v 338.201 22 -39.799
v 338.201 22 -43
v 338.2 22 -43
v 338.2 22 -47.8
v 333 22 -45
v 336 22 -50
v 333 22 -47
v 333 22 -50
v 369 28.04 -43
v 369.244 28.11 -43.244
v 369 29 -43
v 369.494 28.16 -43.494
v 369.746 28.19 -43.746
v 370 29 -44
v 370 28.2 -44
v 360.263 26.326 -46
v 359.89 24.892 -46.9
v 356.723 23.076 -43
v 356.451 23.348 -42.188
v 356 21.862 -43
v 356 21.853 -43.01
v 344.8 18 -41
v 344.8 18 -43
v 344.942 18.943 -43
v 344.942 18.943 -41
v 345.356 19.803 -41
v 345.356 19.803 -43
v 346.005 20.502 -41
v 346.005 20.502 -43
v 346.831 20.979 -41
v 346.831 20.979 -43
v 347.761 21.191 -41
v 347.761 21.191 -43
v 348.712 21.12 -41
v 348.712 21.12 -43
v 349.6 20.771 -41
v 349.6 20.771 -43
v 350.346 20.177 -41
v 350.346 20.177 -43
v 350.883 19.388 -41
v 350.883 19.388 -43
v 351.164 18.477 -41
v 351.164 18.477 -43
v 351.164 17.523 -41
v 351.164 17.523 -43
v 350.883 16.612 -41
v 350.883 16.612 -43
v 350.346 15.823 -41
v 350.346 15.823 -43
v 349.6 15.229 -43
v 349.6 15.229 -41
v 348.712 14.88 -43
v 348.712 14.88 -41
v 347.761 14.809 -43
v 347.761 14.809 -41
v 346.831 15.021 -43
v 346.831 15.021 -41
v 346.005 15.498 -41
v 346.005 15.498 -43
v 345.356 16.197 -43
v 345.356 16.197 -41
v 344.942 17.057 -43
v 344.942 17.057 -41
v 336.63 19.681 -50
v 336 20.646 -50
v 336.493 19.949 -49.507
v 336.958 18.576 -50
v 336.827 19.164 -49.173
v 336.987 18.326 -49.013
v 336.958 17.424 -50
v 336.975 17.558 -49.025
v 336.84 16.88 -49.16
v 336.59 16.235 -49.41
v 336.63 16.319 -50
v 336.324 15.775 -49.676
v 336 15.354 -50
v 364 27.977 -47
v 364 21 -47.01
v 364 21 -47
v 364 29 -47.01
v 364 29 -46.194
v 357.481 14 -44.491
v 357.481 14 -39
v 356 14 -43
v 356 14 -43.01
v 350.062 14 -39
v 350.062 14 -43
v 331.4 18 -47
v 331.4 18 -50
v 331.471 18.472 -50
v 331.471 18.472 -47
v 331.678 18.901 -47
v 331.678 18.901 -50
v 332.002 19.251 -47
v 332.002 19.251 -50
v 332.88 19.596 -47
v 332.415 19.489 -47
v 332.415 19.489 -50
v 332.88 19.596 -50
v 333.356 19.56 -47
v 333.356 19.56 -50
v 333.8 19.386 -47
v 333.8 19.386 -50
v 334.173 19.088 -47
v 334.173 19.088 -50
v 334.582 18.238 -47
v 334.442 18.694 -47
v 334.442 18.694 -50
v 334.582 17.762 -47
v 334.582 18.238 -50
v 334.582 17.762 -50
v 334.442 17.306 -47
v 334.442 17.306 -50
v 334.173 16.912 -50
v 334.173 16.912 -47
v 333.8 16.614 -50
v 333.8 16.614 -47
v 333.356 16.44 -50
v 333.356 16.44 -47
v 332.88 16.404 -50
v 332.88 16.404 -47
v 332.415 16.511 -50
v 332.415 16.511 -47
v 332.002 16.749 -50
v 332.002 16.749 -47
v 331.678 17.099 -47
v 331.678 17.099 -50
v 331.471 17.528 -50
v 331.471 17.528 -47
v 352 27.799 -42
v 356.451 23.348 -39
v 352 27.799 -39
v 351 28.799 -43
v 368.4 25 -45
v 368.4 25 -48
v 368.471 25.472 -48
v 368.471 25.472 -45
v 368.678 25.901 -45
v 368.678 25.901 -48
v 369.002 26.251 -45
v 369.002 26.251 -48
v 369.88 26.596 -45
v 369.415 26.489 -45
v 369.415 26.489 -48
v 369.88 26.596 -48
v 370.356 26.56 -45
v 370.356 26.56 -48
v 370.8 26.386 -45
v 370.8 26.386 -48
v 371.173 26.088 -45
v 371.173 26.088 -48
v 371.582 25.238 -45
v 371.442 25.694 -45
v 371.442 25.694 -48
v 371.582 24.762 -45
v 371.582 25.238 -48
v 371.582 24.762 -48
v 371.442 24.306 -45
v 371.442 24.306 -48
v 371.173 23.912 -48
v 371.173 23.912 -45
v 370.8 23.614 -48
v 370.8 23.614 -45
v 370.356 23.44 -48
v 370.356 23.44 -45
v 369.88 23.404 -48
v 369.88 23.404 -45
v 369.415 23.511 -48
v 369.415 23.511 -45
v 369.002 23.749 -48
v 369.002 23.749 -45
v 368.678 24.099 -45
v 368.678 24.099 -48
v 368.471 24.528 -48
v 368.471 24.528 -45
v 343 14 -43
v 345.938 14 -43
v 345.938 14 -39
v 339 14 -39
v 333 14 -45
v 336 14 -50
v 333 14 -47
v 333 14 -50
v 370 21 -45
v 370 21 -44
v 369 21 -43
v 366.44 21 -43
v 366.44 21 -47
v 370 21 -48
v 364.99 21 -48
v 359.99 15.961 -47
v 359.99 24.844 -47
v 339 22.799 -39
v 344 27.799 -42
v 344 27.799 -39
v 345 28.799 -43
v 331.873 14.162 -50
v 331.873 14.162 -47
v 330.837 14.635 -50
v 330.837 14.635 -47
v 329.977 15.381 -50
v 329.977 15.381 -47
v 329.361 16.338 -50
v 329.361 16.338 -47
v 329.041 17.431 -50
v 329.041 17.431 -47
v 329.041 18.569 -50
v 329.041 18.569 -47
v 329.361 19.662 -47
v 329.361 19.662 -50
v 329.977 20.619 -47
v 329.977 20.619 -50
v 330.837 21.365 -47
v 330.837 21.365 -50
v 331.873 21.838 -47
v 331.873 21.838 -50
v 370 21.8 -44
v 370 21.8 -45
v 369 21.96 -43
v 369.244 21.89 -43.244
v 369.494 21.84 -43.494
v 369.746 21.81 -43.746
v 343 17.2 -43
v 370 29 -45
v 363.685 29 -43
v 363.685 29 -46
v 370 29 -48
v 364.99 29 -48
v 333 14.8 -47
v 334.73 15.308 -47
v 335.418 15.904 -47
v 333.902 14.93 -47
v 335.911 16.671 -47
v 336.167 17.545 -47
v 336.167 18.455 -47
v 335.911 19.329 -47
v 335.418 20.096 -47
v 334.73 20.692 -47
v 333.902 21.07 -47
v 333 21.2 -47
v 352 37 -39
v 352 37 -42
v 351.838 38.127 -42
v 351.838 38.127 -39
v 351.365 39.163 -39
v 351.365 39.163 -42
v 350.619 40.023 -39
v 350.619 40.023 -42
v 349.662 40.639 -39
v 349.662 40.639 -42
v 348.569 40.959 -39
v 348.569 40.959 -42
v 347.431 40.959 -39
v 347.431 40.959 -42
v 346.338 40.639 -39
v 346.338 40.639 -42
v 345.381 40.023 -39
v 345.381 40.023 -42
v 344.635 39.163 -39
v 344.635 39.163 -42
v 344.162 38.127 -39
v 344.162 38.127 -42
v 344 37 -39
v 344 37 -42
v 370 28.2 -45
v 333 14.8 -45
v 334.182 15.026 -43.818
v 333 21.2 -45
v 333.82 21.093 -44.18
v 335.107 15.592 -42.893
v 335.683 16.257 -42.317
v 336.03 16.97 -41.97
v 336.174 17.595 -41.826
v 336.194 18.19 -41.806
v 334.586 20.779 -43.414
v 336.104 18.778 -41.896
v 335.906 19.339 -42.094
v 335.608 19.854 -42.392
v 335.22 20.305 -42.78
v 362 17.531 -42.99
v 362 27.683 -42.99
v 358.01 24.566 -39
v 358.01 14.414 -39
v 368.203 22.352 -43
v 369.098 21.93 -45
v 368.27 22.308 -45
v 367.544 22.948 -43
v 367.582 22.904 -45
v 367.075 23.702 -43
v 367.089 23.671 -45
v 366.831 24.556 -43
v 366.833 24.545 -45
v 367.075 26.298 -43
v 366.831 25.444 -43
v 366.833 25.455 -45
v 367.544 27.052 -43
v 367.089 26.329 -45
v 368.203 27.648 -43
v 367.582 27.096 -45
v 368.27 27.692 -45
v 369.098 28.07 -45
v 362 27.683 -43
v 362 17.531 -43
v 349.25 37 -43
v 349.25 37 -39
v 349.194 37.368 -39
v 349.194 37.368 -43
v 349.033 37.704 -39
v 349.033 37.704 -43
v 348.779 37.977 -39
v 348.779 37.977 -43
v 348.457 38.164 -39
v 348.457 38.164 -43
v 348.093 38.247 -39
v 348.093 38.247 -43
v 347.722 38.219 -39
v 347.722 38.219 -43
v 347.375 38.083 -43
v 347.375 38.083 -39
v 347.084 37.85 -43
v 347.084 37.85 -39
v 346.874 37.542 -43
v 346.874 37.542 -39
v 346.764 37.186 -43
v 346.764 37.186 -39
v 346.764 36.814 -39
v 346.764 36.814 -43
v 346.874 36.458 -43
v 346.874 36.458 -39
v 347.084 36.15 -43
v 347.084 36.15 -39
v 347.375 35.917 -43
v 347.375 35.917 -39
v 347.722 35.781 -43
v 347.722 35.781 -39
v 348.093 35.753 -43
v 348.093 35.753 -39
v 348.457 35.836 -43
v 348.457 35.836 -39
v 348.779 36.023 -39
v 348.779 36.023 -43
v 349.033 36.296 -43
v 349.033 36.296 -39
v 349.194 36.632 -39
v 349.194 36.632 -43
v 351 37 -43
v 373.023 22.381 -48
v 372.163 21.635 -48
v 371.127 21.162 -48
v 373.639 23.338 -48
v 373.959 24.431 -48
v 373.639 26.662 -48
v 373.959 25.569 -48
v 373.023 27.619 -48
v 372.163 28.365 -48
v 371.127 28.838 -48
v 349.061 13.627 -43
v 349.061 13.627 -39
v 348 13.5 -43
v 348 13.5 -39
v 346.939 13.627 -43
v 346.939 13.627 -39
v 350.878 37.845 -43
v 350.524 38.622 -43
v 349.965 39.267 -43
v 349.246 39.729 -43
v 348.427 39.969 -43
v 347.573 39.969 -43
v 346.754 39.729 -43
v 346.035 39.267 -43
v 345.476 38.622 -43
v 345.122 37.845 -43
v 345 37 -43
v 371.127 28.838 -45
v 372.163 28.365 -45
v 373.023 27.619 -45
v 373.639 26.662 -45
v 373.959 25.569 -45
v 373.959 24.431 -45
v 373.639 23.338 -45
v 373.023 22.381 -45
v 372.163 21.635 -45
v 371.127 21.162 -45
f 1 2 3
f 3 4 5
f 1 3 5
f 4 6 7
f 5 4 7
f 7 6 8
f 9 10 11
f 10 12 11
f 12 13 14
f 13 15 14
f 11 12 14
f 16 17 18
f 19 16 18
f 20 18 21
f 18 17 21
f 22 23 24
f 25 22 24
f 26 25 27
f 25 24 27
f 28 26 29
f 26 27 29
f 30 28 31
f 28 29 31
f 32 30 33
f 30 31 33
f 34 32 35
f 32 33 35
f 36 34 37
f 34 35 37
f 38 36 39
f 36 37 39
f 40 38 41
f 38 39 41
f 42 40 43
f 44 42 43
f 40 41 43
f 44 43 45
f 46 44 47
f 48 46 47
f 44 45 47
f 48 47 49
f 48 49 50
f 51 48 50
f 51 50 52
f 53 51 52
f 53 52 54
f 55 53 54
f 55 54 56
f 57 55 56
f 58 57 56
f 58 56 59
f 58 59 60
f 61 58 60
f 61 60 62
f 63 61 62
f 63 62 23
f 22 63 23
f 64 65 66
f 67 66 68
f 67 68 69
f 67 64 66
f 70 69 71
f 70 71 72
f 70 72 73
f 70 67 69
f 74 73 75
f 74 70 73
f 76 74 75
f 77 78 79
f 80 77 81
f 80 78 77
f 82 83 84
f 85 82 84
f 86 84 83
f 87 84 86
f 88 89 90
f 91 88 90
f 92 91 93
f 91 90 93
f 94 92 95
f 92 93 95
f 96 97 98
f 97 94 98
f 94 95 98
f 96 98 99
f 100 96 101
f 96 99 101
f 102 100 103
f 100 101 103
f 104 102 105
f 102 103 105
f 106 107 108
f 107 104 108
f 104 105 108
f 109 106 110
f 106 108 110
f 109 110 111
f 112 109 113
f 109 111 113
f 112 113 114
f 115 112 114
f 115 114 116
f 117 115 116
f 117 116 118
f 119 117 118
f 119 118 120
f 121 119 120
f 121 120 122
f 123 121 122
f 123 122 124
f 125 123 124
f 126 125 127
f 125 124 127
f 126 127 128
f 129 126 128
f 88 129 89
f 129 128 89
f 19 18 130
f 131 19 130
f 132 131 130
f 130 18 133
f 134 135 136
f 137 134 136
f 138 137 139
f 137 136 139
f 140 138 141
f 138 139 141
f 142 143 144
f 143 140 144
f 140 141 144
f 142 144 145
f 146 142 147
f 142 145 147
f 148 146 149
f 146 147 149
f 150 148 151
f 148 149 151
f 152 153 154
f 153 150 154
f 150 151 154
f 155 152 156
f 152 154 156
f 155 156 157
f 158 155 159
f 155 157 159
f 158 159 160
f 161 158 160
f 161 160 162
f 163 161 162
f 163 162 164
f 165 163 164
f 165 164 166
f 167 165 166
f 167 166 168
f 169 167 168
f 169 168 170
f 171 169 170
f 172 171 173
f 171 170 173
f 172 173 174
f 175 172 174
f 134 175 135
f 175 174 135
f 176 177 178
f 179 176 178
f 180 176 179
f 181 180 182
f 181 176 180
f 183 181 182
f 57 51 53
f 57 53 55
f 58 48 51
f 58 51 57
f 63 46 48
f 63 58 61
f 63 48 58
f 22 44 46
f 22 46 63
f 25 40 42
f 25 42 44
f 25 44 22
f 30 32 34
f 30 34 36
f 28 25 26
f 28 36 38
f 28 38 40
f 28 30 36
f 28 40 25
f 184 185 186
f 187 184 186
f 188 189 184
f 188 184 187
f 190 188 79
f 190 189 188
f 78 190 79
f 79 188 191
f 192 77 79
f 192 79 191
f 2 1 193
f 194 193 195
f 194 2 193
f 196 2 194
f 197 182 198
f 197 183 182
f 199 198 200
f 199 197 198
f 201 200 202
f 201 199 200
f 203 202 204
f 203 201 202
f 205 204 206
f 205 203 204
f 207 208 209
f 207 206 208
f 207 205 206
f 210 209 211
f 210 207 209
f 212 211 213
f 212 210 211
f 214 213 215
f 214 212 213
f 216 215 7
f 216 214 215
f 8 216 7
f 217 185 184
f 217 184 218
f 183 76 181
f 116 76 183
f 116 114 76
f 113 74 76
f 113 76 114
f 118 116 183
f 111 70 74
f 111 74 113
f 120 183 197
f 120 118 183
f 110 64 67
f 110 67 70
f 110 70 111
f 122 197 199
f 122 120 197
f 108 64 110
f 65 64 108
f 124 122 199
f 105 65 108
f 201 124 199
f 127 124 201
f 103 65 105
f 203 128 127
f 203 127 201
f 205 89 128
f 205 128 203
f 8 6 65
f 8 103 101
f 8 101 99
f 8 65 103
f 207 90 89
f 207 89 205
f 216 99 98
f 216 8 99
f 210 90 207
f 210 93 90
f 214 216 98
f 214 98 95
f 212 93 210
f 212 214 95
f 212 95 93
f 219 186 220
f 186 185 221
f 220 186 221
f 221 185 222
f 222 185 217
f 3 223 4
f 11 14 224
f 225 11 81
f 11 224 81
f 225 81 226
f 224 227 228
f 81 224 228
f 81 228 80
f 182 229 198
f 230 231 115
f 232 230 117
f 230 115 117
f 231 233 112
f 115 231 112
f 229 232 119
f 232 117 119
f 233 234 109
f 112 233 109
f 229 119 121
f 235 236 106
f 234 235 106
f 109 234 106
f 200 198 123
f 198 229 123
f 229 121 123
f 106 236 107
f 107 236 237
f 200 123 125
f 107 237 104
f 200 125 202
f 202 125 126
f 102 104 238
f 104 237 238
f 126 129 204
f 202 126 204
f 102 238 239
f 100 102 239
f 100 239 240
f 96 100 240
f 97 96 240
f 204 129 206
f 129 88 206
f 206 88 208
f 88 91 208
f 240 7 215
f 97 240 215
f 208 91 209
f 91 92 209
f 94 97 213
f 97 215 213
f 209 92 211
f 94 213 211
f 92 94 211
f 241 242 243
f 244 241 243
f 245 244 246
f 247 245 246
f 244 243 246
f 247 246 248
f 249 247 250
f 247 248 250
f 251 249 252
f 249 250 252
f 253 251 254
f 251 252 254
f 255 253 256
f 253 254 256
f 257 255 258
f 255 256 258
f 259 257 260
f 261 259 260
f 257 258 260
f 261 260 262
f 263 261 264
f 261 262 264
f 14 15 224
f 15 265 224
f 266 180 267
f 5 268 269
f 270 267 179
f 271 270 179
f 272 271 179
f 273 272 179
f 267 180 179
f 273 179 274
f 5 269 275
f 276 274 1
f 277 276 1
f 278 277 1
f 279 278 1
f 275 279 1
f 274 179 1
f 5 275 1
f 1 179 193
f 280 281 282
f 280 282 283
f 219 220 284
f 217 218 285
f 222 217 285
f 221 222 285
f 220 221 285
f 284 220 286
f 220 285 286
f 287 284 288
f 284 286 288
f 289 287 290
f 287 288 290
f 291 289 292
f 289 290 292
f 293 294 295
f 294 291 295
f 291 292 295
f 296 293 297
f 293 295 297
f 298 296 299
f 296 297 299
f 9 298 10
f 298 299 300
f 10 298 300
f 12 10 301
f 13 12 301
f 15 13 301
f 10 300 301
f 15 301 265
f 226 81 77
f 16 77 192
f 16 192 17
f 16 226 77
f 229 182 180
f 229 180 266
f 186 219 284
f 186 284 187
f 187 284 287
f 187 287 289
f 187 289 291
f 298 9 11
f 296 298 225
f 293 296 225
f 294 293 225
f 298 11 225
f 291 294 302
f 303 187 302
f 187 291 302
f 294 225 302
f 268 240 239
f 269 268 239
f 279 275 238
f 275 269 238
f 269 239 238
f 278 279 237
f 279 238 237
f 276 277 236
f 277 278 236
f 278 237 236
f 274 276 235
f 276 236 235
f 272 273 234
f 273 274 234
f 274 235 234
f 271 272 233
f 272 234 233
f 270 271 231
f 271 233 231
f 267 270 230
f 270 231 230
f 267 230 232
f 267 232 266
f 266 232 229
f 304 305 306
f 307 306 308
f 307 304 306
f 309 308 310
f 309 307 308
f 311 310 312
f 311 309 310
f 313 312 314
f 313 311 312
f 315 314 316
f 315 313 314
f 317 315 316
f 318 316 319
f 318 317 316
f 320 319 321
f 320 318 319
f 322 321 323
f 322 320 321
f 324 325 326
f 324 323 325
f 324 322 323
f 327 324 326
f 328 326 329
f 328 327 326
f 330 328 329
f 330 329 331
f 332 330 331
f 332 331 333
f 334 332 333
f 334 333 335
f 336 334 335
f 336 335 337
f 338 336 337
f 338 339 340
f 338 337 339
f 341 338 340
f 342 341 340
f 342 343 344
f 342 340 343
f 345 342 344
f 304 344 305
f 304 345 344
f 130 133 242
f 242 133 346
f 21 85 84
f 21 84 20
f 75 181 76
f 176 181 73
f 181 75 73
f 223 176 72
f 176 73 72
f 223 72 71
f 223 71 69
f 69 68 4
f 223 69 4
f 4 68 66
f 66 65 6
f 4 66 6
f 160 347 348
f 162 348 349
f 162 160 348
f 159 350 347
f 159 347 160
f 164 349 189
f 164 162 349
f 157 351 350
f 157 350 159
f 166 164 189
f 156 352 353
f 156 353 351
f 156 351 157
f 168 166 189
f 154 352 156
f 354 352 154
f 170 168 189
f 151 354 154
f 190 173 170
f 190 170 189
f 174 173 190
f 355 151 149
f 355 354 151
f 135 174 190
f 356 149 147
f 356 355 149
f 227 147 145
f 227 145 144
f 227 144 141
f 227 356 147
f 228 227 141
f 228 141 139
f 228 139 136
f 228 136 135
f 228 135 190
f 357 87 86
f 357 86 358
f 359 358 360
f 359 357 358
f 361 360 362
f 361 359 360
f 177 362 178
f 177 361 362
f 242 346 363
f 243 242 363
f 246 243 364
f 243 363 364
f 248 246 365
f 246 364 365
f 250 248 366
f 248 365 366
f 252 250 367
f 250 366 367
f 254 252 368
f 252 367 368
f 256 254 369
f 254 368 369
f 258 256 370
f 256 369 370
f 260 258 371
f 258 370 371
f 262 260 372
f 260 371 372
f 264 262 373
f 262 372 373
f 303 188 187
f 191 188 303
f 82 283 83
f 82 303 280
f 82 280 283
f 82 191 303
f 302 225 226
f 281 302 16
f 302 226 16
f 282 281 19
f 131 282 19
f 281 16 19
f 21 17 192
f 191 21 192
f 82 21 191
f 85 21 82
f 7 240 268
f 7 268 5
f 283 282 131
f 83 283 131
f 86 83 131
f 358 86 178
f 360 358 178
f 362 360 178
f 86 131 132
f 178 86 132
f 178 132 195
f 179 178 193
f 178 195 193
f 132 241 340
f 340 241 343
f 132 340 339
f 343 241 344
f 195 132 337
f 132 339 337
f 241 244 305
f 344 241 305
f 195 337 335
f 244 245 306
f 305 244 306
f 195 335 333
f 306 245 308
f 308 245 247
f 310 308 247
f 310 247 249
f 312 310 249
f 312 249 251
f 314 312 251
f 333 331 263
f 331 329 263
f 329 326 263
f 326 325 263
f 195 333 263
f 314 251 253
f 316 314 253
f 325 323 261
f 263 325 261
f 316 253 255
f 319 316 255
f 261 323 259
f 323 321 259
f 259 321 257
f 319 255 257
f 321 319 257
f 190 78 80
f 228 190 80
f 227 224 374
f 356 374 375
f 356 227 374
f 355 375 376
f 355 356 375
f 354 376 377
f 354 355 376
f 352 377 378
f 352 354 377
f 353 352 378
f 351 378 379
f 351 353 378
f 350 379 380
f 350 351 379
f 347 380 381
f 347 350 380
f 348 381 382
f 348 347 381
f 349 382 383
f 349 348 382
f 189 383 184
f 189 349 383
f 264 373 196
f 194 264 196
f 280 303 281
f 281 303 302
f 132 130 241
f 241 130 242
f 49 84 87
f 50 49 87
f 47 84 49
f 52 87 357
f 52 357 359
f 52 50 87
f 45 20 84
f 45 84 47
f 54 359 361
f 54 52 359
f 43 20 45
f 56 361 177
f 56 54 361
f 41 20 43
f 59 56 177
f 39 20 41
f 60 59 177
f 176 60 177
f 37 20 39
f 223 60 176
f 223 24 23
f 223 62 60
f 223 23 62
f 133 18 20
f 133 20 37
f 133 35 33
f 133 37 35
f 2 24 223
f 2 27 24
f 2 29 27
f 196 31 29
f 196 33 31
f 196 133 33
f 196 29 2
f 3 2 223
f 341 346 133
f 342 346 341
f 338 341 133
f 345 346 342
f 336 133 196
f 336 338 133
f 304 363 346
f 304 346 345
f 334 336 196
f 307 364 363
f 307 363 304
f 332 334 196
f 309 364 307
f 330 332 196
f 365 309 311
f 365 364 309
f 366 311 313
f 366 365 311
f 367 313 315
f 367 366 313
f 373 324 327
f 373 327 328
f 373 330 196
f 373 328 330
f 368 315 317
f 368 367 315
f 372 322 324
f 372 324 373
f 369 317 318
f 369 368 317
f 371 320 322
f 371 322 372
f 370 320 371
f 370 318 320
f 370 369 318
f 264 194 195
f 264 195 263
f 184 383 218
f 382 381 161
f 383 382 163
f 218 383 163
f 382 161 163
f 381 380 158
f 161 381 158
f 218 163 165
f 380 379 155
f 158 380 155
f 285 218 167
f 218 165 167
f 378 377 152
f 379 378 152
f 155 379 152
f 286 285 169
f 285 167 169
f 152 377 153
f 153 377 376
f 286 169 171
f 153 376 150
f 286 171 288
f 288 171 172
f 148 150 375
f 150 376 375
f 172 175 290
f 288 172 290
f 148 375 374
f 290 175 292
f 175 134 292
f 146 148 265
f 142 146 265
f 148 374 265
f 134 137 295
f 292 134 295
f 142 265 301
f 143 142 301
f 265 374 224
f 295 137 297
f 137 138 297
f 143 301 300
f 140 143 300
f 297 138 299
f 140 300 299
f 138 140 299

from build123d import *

# Parameters (mm, degrees)
CYLINDER778_R                     = 1.25
CYLINDER778_DEPTH                 = 5
CYLINDER796_R                     = 4
CYLINDER796_DEPTH                 = 4
BOX526_W                          = 10
BOX526_H                          = 10
BOX526_DEPTH                      = 10
CYLINDER028_R                     = 1.6
CYLINDER028_DEPTH                 = 4
CYLINDER027_R                     = 4
CYLINDER027_DEPTH                 = 4
BOX037_W                          = 10
BOX037_H                          = 10
BOX037_DEPTH                      = 10
CYLINDER776_R                     = 1.6
CYLINDER776_DEPTH                 = 10
BOX509_W                          = 6
BOX509_H                          = 8
BOX509_DEPTH                      = 1
CYLINDER026_R                     = 3.2
CYLINDER026_DEPTH                 = 10
BOX035_W                          = 10
BOX035_H                          = 15
BOX035_DEPTH                      = 10
CYLINDER025_R                     = 1.6
CYLINDER025_DEPTH                 = 10
CYLINDER775_R                     = 1.6
CYLINDER775_DEPTH                 = 10
BOX033_W                          = 10
BOX033_H                          = 10
BOX033_DEPTH                      = 8
BOX033_PLACEMENT_ANGLE            = 45
CYLINDER024_R                     = 3.2
CYLINDER024_DEPTH                 = 10
BOX032_W                          = 10
BOX032_H                          = 8
BOX032_DEPTH                      = 11
CHAMFER082_SIZE                   = 7
CHAMFER083_SIZE                   = 6
CYLINDER774_R                     = 3.2
CYLINDER774_DEPTH                 = 2
BOX507_W                          = 8
BOX507_H                          = 27
BOX507_DEPTH                      = 4
BOX029_W                          = 10
BOX029_H                          = 10
BOX029_DEPTH                      = 4
BOX028_W                          = 14
BOX028_H                          = 14
BOX028_DEPTH                      = 4
BOX028_PLACEMENT_ANGLE            = 45
BOX027_W                          = 10
BOX027_H                          = 10
BOX027_DEPTH                      = 4
BOX026_W                          = 10
BOX026_H                          = 10
BOX026_DEPTH                      = 4
BOX024_W                          = 15
BOX024_H                          = 8
BOX024_DEPTH                      = 4
BOX024_PLACEMENT_ANGLE            = -38
BOX025_W                          = 9
BOX025_H                          = 8
BOX025_DEPTH                      = 4
BOX023_W                          = 6
BOX023_H                          = 8
BOX023_DEPTH                      = 4
CYLINDER773_R                     = 4
CYLINDER773_DEPTH                 = 4
CYLINDER772_R                     = 4.5
CYLINDER772_DEPTH                 = 4
BOX508_W                          = 11
BOX508_H                          = 8
BOX508_DEPTH                      = 4
CHAMFER084_SIZE                   = 2
CYLINDER770_R                     = 4
CYLINDER770_DEPTH                 = 3
CHAMFER086_SIZE                   = 3.99
BOX034_W                          = 10
BOX034_H                          = 11
BOX034_DEPTH                      = 10
CHAMFER085_SIZE                   = 3.99
CYLINDER771_R                     = 4
CYLINDER771_DEPTH                 = 3
CHAMFER087_SIZE                   = 1
CHAMFER088_SIZE                   = 0.99
CHAMFER089_SIZE                   = 1
PART_MIRRORING096_PLACEMENT_ANGLE = 180
CHAMFER099_SIZE                   = 1


with BuildPart() as cylinder984:
    # Cylinder778 → Cylinder778 (new body)
    with BuildSketch(Plane(origin=(348, 37, -43), x_dir=(1, 0, 0), z_dir=(0, 0, 1))):
        Circle(CYLINDER778_R)
    extrude(amount=CYLINDER778_DEPTH)


with BuildPart() as cylinder987:
    # Cylinder796 → Cylinder796 (new body)
    with BuildSketch(Plane(origin=(348, 37, -43), x_dir=(1, 0, 0), z_dir=(0, 0, 1))):
        Circle(CYLINDER796_R)
    extrude(amount=CYLINDER796_DEPTH)


with BuildPart() as cube726:
    # Box526 → Box526 (new body)
    with BuildSketch(Plane(origin=(343, 37, -46), x_dir=(1, 0, 0), z_dir=(0, 0, 1))):
        with Locations((5, 5)):
            Rectangle(BOX526_W, BOX526_H)
    extrude(amount=BOX526_DEPTH)


with BuildPart() as cylinder028:
    # Cylinder028 → Cylinder028 (new body)
    with BuildSketch(Plane(origin=(-15, 23, 8), x_dir=(1, 0, 0), z_dir=(0, 0, 1))):
        Circle(CYLINDER028_R)
    extrude(amount=CYLINDER028_DEPTH)


with BuildPart() as cylinder027:
    # Cylinder027 → Cylinder027 (new body)
    with BuildSketch(Plane(origin=(-15, 23, 8), x_dir=(1, 0, 0), z_dir=(0, 0, 1))):
        Circle(CYLINDER027_R)
    extrude(amount=CYLINDER027_DEPTH)


with BuildPart() as cube037:
    # Box037 → Box037 (new body)
    with BuildSketch(Plane(origin=(-19, 23, 3), x_dir=(1, 0, 0), z_dir=(0, 0, 1))):
        with Locations((5, 5)):
            Rectangle(BOX037_W, BOX037_H)
    extrude(amount=BOX037_DEPTH)


with BuildPart() as cylinder983:
    # Cylinder776 → Cylinder776 (new body)
    with BuildSketch(Plane(origin=(-37, 7, 2), x_dir=(1, 0, 0), z_dir=(0, 0, 1))):
        Circle(CYLINDER776_R)
    extrude(amount=CYLINDER776_DEPTH)


with BuildPart() as cube036:
    # Box509 → Box509 (new body)
    with BuildSketch(Plane(origin=(-37, 3, 3), x_dir=(1, 0, 0), z_dir=(0, 0, 1))):
        with Locations((3, 4)):
            Rectangle(BOX509_W, BOX509_H)
    extrude(amount=BOX509_DEPTH)


with BuildPart() as cylinder026:
    # Cylinder026 → Cylinder026 (new body)
    with BuildSketch(Plane(origin=(-37, 7, 6), x_dir=(1, 0, 0), z_dir=(0, 0, 1))):
        Circle(CYLINDER026_R)
    extrude(amount=CYLINDER026_DEPTH)


with BuildPart() as cube035:
    # Box035 → Box035 (new body)
    with BuildSketch(Plane(origin=(-39, -2, 8), x_dir=(1, 0, 0), z_dir=(0, 0, 1))):
        with Locations((5, 7.5)):
            Rectangle(BOX035_W, BOX035_H)
    extrude(amount=BOX035_DEPTH)


with BuildPart() as cylinder025:
    # Cylinder025 → Cylinder025 (new body)
    with BuildSketch(Plane(origin=(-15, 27, 4), x_dir=(1, 0, 0), z_dir=(0, 0, 1))):
        Circle(CYLINDER025_R)
    extrude(amount=CYLINDER025_DEPTH)


with BuildPart() as fusion023:
    # Cylinder775 → Cylinder775 (new body)
    with BuildSketch(Plane.XY):
        Circle(CYLINDER775_R)
    extrude(amount=CYLINDER775_DEPTH)

    # Fusion023: union Cylinder025
    add(cylinder025.part)


with BuildPart() as cube033:
    # Box033 → Box033 (new body)
    with BuildSketch(Plane.XY):
        with Locations((5, 5)):
            Rectangle(BOX033_W, BOX033_H)
    extrude(amount=BOX033_DEPTH)


with BuildPart() as cube033_1:
    # Box033 placement: moved
    add(cube033.part.moved(Location((-10.2, -1, 0))).rotate(Axis((-10.2, -1, 0), (0, 0, 1)), BOX033_PLACEMENT_ANGLE))


with BuildPart() as cylinder024:
    # Cylinder024 → Cylinder024 (new body)
    with BuildSketch(Plane.XY.offset(4)):
        Circle(CYLINDER024_R)
    extrude(amount=CYLINDER024_DEPTH)


with BuildPart() as chamfer083:
    # Box032 → Box032 (new body)
    with BuildSketch(Plane(origin=(-10, -4, 1), x_dir=(1, 0, 0), z_dir=(0, 0, 1))):
        with Locations((5, 4)):
            Rectangle(BOX032_W, BOX032_H)
    extrude(amount=BOX032_DEPTH)

    # Chamfer082
    chamfer082_edges = [chamfer083.edges().sort_by_distance(p)[0] for p in [
        (-10, 0, 1),
    ]]
    chamfer(chamfer082_edges, length=CHAMFER082_SIZE)

    # Chamfer083
    chamfer083_edges = [chamfer083.edges().sort_by_distance(p)[0] for p in [
        (0, 0, 12),
    ]]
    chamfer(chamfer083_edges, length=CHAMFER083_SIZE)


with BuildPart() as cylinder981:
    # Cylinder774 → Cylinder774 (new body)
    with BuildSketch(Plane(origin=(-15, 0, 8), x_dir=(1, 0, 0), z_dir=(0, 0, 1))):
        Circle(CYLINDER774_R)
    extrude(amount=CYLINDER774_DEPTH)


with BuildPart() as cube021:
    # Box507 → Box507 (new body)
    with BuildSketch(Plane(origin=(-19, 0, 8), x_dir=(1, 0, 0), z_dir=(0, 0, 1))):
        with Locations((4, 13.5)):
            Rectangle(BOX507_W, BOX507_H)
    extrude(amount=BOX507_DEPTH)


with BuildPart() as cube029:
    # Box029 → Box029 (new body)
    with BuildSketch(Plane(origin=(-20, -14, 8), x_dir=(1, 0, 0), z_dir=(0, 0, 1))):
        with Locations((5, 5)):
            Rectangle(BOX029_W, BOX029_H)
    extrude(amount=BOX029_DEPTH)


with BuildPart() as cut013:
    # Box028 → Box028 (new body)
    with BuildSketch(Plane.XY):
        with Locations((7, 7)):
            Rectangle(BOX028_W, BOX028_H)
    extrude(amount=BOX028_DEPTH)


with BuildPart() as cut013_1:
    # Box028 placement: moved
    add(cut013.part.moved(Location((-15, -6, 8))).rotate(Axis((-15, -6, 8), (0, 0, 1)), BOX028_PLACEMENT_ANGLE))

    # Cut013: cut Cube029
    add(cube029.part, mode=Mode.SUBTRACT)


with BuildPart() as cube027:
    # Box027 → Box027 (new body)
    with BuildSketch(Plane(origin=(-35, 11, 8), x_dir=(1, 0, 0), z_dir=(0, 0, 1))):
        with Locations((5, 5)):
            Rectangle(BOX027_W, BOX027_H)
    extrude(amount=BOX027_DEPTH)


with BuildPart() as cube026:
    # Box026 → Box026 (new body)
    with BuildSketch(Plane(origin=(-30, -14, 8), x_dir=(1, 0, 0), z_dir=(0, 0, 1))):
        with Locations((5, 5)):
            Rectangle(BOX026_W, BOX026_H)
    extrude(amount=BOX026_DEPTH)


with BuildPart() as fusion507:
    # Fusion507 base: copy of Cube026
    add(cube026.part)

    # Fusion507: union Cube027
    add(cube027.part)


with BuildPart() as cube709:
    # Box024 → Box024 (new body)
    with BuildSketch(Plane.XY):
        with Locations((7.5, 4)):
            Rectangle(BOX024_W, BOX024_H)
    extrude(amount=BOX024_DEPTH)


with BuildPart() as cube709_1:
    # Box024 placement: moved
    add(cube709.part.moved(Location((-36, 5, 8))).rotate(Axis((-36, 5, 8), (0, 0, 1)), BOX024_PLACEMENT_ANGLE))


with BuildPart() as cube025:
    # Box025 → Box025 (new body)
    with BuildSketch(Plane(origin=(-24, -4, 8), x_dir=(1, 0, 0), z_dir=(0, 0, 1))):
        with Locations((4.5, 4)):
            Rectangle(BOX025_W, BOX025_H)
    extrude(amount=BOX025_DEPTH)


with BuildPart() as cube023:
    # Box023 → Box023 (new body)
    with BuildSketch(Plane(origin=(-37, 3, 8), x_dir=(1, 0, 0), z_dir=(0, 0, 1))):
        with Locations((3, 4)):
            Rectangle(BOX023_W, BOX023_H)
    extrude(amount=BOX023_DEPTH)


with BuildPart() as cut881:
    # Fusion017 base: copy of Cube023
    add(cube023.part)

    # Fusion017: union Cube709, Cube025
    add(cube709_1.part)
    add(cube025.part)

    # Cut609: cut Fusion507
    add(fusion507.part, mode=Mode.SUBTRACT)


with BuildPart() as cylinder980:
    # Cylinder773 → Cylinder773 (new body)
    with BuildSketch(Plane(origin=(-15, 27, 8), x_dir=(1, 0, 0), z_dir=(0, 0, 1))):
        Circle(CYLINDER773_R)
    extrude(amount=CYLINDER773_DEPTH)


with BuildPart() as cylinder979:
    # Cylinder772 → Cylinder772 (new body)
    with BuildSketch(Plane(origin=(-15, 0, 8), x_dir=(1, 0, 0), z_dir=(0, 0, 1))):
        Circle(CYLINDER772_R)
    extrude(amount=CYLINDER772_DEPTH)


with BuildPart() as cut016:
    # Box508 → Box508 (new body)
    with BuildSketch(Plane(origin=(-15, -4, 8), x_dir=(1, 0, 0), z_dir=(0, 0, 1))):
        with Locations((5.5, 4)):
            Rectangle(BOX508_W, BOX508_H)
    extrude(amount=BOX508_DEPTH)

    # Fusion508: union Cube021, Cut013, Cut881, Cylinder980, Cylinder979
    add(cube021.part)
    add(cut013_1.part)
    add(cut881.part)
    add(cylinder980.part)
    add(cylinder979.part)

    # Cut014: cut Cylinder981
    add(cylinder981.part, mode=Mode.SUBTRACT)

    # Chamfer084
    chamfer084_edges = [cut016.edges().sort_by_distance(p)[0] for p in [
        (-4, 0, 12),
    ]]
    chamfer(chamfer084_edges, length=CHAMFER084_SIZE)

    # Fusion020: union Chamfer083
    add(chamfer083.part)

    # Cut015: cut Cylinder024
    add(cylinder024.part, mode=Mode.SUBTRACT)

    # Cut016: cut Cube033
    add(cube033_1.part, mode=Mode.SUBTRACT)


with BuildPart() as chamfer086:
    # Cylinder770 → Cylinder770 (new body)
    with BuildSketch(Plane.XY.offset(1)):
        Circle(CYLINDER770_R)
    extrude(amount=CYLINDER770_DEPTH)

    # Fusion022: union Cut016
    add(cut016.part)

    # Cut017: cut Fusion023
    add(fusion023.part, mode=Mode.SUBTRACT)

    # Cut613: cut Cube035
    add(cube035.part, mode=Mode.SUBTRACT)

    # Chamfer086
    chamfer086_edges = [chamfer086.edges().sort_by_distance(p)[0] for p in [
        (-29, 4.607073, 12),
    ]]
    chamfer(chamfer086_edges, length=CHAMFER086_SIZE)


with BuildPart() as cube034:
    # Box034 → Box034 (new body)
    with BuildSketch(Plane(origin=(-23, -4, 0), x_dir=(1, 0, 0), z_dir=(0, 0, 1))):
        with Locations((5, 5.5)):
            Rectangle(BOX034_W, BOX034_H)
    extrude(amount=BOX034_DEPTH)


with BuildPart() as fusion024:
    # Fusion024 base: copy of Cube026
    add(cube026.part)

    # Fusion024: union Cube027
    add(cube027.part)


with BuildPart() as fusion026:
    # Fusion025 base: copy of Cube023
    add(cube023.part)

    # Fusion025: union Cube709, Cube025
    add(cube709_1.part)
    add(cube025.part)

    # Cut611: cut Fusion024
    add(fusion024.part, mode=Mode.SUBTRACT)


with BuildPart() as fusion026_1:
    # Cut611 placement: moved
    add(fusion026.part.moved(Location((0, 0, -4))))

    # Cut612: cut Cube034
    add(cube034.part, mode=Mode.SUBTRACT)

    # Chamfer085
    chamfer085_edges = [fusion026_1.edges().sort_by_distance(p)[0] for p in [
        (-23, 0.497716, 4),
    ]]
    chamfer(chamfer085_edges, length=CHAMFER085_SIZE)

    # Fusion026: union Chamfer086
    add(chamfer086.part)


with BuildPart() as cut024:
    # Cylinder771 → Cylinder771 (new body)
    with BuildSketch(Plane(origin=(-37, 7, 3), x_dir=(1, 0, 0), z_dir=(0, 0, 1))):
        Circle(CYLINDER771_R)
    extrude(amount=CYLINDER771_DEPTH)

    # Fusion027: union Fusion026
    add(fusion026_1.part)

    # Chamfer087
    chamfer087_edges = [cut024.edges().sort_by_distance(p)[0] for p in [
        (-37, 7, 8),
    ]]
    chamfer(chamfer087_edges, length=CHAMFER087_SIZE)

    # Cut614: cut Cylinder026
    add(cylinder026.part, mode=Mode.SUBTRACT)

    # Fusion028: union Cube036
    add(cube036.part)

    # Chamfer088
    chamfer088_edges = [cut024.edges().sort_by_distance(p)[0] for p in [
        (-31, 7, 3),
    ]]
    chamfer(chamfer088_edges, length=CHAMFER088_SIZE)

    # Cut022: cut Cylinder983
    add(cylinder983.part, mode=Mode.SUBTRACT)

    # Chamfer089
    chamfer089_edges = [cut024.edges().sort_by_distance(p)[0] for p in [
        (-28.837748, 9.556381, 4),
        (-24.995, 6.554097, 5.995),
    ]]
    chamfer(chamfer089_edges, length=CHAMFER089_SIZE)

    # Cut023: cut Cube037
    add(cube037.part, mode=Mode.SUBTRACT)

    # Fusion509: union Cylinder027
    add(cylinder027.part)

    # Cut024: cut Cylinder028
    add(cylinder028.part, mode=Mode.SUBTRACT)


with BuildPart() as central_axle_steering_knukle:
    # Part__Mirroring096: instance of Cut024
    add(cut024.part.mirror(Plane(origin=(0, 0, 0), x_dir=(1, 0, 0), z_dir=(0, 1, 0))))


with BuildPart() as central_axle_steering_knukle_1:
    # Part__Mirroring096 placement: moved
    add(central_axle_steering_knukle.part.moved(Location((333, 18, -51))).rotate(Axis((333, 18, -51), (0, 0, 1)), PART_MIRRORING096_PLACEMENT_ANGLE))

    # Cut630: cut Cube726
    add(cube726.part, mode=Mode.SUBTRACT)

    # Fusion526: union Cylinder987
    add(cylinder987.part)

    # Cut631: cut Cylinder984
    add(cylinder984.part, mode=Mode.SUBTRACT)

    # Chamfer099
    chamfer099_edges = [central_axle_steering_knukle_1.edges().sort_by_distance(p)[0] for p in [
        (352, 32.399495, -43),
        (348, 41, -43),
        (344, 32.399495, -43),
    ]]
    chamfer(chamfer099_edges, length=CHAMFER099_SIZE)


solid = central_axle_steering_knukle_1.part
